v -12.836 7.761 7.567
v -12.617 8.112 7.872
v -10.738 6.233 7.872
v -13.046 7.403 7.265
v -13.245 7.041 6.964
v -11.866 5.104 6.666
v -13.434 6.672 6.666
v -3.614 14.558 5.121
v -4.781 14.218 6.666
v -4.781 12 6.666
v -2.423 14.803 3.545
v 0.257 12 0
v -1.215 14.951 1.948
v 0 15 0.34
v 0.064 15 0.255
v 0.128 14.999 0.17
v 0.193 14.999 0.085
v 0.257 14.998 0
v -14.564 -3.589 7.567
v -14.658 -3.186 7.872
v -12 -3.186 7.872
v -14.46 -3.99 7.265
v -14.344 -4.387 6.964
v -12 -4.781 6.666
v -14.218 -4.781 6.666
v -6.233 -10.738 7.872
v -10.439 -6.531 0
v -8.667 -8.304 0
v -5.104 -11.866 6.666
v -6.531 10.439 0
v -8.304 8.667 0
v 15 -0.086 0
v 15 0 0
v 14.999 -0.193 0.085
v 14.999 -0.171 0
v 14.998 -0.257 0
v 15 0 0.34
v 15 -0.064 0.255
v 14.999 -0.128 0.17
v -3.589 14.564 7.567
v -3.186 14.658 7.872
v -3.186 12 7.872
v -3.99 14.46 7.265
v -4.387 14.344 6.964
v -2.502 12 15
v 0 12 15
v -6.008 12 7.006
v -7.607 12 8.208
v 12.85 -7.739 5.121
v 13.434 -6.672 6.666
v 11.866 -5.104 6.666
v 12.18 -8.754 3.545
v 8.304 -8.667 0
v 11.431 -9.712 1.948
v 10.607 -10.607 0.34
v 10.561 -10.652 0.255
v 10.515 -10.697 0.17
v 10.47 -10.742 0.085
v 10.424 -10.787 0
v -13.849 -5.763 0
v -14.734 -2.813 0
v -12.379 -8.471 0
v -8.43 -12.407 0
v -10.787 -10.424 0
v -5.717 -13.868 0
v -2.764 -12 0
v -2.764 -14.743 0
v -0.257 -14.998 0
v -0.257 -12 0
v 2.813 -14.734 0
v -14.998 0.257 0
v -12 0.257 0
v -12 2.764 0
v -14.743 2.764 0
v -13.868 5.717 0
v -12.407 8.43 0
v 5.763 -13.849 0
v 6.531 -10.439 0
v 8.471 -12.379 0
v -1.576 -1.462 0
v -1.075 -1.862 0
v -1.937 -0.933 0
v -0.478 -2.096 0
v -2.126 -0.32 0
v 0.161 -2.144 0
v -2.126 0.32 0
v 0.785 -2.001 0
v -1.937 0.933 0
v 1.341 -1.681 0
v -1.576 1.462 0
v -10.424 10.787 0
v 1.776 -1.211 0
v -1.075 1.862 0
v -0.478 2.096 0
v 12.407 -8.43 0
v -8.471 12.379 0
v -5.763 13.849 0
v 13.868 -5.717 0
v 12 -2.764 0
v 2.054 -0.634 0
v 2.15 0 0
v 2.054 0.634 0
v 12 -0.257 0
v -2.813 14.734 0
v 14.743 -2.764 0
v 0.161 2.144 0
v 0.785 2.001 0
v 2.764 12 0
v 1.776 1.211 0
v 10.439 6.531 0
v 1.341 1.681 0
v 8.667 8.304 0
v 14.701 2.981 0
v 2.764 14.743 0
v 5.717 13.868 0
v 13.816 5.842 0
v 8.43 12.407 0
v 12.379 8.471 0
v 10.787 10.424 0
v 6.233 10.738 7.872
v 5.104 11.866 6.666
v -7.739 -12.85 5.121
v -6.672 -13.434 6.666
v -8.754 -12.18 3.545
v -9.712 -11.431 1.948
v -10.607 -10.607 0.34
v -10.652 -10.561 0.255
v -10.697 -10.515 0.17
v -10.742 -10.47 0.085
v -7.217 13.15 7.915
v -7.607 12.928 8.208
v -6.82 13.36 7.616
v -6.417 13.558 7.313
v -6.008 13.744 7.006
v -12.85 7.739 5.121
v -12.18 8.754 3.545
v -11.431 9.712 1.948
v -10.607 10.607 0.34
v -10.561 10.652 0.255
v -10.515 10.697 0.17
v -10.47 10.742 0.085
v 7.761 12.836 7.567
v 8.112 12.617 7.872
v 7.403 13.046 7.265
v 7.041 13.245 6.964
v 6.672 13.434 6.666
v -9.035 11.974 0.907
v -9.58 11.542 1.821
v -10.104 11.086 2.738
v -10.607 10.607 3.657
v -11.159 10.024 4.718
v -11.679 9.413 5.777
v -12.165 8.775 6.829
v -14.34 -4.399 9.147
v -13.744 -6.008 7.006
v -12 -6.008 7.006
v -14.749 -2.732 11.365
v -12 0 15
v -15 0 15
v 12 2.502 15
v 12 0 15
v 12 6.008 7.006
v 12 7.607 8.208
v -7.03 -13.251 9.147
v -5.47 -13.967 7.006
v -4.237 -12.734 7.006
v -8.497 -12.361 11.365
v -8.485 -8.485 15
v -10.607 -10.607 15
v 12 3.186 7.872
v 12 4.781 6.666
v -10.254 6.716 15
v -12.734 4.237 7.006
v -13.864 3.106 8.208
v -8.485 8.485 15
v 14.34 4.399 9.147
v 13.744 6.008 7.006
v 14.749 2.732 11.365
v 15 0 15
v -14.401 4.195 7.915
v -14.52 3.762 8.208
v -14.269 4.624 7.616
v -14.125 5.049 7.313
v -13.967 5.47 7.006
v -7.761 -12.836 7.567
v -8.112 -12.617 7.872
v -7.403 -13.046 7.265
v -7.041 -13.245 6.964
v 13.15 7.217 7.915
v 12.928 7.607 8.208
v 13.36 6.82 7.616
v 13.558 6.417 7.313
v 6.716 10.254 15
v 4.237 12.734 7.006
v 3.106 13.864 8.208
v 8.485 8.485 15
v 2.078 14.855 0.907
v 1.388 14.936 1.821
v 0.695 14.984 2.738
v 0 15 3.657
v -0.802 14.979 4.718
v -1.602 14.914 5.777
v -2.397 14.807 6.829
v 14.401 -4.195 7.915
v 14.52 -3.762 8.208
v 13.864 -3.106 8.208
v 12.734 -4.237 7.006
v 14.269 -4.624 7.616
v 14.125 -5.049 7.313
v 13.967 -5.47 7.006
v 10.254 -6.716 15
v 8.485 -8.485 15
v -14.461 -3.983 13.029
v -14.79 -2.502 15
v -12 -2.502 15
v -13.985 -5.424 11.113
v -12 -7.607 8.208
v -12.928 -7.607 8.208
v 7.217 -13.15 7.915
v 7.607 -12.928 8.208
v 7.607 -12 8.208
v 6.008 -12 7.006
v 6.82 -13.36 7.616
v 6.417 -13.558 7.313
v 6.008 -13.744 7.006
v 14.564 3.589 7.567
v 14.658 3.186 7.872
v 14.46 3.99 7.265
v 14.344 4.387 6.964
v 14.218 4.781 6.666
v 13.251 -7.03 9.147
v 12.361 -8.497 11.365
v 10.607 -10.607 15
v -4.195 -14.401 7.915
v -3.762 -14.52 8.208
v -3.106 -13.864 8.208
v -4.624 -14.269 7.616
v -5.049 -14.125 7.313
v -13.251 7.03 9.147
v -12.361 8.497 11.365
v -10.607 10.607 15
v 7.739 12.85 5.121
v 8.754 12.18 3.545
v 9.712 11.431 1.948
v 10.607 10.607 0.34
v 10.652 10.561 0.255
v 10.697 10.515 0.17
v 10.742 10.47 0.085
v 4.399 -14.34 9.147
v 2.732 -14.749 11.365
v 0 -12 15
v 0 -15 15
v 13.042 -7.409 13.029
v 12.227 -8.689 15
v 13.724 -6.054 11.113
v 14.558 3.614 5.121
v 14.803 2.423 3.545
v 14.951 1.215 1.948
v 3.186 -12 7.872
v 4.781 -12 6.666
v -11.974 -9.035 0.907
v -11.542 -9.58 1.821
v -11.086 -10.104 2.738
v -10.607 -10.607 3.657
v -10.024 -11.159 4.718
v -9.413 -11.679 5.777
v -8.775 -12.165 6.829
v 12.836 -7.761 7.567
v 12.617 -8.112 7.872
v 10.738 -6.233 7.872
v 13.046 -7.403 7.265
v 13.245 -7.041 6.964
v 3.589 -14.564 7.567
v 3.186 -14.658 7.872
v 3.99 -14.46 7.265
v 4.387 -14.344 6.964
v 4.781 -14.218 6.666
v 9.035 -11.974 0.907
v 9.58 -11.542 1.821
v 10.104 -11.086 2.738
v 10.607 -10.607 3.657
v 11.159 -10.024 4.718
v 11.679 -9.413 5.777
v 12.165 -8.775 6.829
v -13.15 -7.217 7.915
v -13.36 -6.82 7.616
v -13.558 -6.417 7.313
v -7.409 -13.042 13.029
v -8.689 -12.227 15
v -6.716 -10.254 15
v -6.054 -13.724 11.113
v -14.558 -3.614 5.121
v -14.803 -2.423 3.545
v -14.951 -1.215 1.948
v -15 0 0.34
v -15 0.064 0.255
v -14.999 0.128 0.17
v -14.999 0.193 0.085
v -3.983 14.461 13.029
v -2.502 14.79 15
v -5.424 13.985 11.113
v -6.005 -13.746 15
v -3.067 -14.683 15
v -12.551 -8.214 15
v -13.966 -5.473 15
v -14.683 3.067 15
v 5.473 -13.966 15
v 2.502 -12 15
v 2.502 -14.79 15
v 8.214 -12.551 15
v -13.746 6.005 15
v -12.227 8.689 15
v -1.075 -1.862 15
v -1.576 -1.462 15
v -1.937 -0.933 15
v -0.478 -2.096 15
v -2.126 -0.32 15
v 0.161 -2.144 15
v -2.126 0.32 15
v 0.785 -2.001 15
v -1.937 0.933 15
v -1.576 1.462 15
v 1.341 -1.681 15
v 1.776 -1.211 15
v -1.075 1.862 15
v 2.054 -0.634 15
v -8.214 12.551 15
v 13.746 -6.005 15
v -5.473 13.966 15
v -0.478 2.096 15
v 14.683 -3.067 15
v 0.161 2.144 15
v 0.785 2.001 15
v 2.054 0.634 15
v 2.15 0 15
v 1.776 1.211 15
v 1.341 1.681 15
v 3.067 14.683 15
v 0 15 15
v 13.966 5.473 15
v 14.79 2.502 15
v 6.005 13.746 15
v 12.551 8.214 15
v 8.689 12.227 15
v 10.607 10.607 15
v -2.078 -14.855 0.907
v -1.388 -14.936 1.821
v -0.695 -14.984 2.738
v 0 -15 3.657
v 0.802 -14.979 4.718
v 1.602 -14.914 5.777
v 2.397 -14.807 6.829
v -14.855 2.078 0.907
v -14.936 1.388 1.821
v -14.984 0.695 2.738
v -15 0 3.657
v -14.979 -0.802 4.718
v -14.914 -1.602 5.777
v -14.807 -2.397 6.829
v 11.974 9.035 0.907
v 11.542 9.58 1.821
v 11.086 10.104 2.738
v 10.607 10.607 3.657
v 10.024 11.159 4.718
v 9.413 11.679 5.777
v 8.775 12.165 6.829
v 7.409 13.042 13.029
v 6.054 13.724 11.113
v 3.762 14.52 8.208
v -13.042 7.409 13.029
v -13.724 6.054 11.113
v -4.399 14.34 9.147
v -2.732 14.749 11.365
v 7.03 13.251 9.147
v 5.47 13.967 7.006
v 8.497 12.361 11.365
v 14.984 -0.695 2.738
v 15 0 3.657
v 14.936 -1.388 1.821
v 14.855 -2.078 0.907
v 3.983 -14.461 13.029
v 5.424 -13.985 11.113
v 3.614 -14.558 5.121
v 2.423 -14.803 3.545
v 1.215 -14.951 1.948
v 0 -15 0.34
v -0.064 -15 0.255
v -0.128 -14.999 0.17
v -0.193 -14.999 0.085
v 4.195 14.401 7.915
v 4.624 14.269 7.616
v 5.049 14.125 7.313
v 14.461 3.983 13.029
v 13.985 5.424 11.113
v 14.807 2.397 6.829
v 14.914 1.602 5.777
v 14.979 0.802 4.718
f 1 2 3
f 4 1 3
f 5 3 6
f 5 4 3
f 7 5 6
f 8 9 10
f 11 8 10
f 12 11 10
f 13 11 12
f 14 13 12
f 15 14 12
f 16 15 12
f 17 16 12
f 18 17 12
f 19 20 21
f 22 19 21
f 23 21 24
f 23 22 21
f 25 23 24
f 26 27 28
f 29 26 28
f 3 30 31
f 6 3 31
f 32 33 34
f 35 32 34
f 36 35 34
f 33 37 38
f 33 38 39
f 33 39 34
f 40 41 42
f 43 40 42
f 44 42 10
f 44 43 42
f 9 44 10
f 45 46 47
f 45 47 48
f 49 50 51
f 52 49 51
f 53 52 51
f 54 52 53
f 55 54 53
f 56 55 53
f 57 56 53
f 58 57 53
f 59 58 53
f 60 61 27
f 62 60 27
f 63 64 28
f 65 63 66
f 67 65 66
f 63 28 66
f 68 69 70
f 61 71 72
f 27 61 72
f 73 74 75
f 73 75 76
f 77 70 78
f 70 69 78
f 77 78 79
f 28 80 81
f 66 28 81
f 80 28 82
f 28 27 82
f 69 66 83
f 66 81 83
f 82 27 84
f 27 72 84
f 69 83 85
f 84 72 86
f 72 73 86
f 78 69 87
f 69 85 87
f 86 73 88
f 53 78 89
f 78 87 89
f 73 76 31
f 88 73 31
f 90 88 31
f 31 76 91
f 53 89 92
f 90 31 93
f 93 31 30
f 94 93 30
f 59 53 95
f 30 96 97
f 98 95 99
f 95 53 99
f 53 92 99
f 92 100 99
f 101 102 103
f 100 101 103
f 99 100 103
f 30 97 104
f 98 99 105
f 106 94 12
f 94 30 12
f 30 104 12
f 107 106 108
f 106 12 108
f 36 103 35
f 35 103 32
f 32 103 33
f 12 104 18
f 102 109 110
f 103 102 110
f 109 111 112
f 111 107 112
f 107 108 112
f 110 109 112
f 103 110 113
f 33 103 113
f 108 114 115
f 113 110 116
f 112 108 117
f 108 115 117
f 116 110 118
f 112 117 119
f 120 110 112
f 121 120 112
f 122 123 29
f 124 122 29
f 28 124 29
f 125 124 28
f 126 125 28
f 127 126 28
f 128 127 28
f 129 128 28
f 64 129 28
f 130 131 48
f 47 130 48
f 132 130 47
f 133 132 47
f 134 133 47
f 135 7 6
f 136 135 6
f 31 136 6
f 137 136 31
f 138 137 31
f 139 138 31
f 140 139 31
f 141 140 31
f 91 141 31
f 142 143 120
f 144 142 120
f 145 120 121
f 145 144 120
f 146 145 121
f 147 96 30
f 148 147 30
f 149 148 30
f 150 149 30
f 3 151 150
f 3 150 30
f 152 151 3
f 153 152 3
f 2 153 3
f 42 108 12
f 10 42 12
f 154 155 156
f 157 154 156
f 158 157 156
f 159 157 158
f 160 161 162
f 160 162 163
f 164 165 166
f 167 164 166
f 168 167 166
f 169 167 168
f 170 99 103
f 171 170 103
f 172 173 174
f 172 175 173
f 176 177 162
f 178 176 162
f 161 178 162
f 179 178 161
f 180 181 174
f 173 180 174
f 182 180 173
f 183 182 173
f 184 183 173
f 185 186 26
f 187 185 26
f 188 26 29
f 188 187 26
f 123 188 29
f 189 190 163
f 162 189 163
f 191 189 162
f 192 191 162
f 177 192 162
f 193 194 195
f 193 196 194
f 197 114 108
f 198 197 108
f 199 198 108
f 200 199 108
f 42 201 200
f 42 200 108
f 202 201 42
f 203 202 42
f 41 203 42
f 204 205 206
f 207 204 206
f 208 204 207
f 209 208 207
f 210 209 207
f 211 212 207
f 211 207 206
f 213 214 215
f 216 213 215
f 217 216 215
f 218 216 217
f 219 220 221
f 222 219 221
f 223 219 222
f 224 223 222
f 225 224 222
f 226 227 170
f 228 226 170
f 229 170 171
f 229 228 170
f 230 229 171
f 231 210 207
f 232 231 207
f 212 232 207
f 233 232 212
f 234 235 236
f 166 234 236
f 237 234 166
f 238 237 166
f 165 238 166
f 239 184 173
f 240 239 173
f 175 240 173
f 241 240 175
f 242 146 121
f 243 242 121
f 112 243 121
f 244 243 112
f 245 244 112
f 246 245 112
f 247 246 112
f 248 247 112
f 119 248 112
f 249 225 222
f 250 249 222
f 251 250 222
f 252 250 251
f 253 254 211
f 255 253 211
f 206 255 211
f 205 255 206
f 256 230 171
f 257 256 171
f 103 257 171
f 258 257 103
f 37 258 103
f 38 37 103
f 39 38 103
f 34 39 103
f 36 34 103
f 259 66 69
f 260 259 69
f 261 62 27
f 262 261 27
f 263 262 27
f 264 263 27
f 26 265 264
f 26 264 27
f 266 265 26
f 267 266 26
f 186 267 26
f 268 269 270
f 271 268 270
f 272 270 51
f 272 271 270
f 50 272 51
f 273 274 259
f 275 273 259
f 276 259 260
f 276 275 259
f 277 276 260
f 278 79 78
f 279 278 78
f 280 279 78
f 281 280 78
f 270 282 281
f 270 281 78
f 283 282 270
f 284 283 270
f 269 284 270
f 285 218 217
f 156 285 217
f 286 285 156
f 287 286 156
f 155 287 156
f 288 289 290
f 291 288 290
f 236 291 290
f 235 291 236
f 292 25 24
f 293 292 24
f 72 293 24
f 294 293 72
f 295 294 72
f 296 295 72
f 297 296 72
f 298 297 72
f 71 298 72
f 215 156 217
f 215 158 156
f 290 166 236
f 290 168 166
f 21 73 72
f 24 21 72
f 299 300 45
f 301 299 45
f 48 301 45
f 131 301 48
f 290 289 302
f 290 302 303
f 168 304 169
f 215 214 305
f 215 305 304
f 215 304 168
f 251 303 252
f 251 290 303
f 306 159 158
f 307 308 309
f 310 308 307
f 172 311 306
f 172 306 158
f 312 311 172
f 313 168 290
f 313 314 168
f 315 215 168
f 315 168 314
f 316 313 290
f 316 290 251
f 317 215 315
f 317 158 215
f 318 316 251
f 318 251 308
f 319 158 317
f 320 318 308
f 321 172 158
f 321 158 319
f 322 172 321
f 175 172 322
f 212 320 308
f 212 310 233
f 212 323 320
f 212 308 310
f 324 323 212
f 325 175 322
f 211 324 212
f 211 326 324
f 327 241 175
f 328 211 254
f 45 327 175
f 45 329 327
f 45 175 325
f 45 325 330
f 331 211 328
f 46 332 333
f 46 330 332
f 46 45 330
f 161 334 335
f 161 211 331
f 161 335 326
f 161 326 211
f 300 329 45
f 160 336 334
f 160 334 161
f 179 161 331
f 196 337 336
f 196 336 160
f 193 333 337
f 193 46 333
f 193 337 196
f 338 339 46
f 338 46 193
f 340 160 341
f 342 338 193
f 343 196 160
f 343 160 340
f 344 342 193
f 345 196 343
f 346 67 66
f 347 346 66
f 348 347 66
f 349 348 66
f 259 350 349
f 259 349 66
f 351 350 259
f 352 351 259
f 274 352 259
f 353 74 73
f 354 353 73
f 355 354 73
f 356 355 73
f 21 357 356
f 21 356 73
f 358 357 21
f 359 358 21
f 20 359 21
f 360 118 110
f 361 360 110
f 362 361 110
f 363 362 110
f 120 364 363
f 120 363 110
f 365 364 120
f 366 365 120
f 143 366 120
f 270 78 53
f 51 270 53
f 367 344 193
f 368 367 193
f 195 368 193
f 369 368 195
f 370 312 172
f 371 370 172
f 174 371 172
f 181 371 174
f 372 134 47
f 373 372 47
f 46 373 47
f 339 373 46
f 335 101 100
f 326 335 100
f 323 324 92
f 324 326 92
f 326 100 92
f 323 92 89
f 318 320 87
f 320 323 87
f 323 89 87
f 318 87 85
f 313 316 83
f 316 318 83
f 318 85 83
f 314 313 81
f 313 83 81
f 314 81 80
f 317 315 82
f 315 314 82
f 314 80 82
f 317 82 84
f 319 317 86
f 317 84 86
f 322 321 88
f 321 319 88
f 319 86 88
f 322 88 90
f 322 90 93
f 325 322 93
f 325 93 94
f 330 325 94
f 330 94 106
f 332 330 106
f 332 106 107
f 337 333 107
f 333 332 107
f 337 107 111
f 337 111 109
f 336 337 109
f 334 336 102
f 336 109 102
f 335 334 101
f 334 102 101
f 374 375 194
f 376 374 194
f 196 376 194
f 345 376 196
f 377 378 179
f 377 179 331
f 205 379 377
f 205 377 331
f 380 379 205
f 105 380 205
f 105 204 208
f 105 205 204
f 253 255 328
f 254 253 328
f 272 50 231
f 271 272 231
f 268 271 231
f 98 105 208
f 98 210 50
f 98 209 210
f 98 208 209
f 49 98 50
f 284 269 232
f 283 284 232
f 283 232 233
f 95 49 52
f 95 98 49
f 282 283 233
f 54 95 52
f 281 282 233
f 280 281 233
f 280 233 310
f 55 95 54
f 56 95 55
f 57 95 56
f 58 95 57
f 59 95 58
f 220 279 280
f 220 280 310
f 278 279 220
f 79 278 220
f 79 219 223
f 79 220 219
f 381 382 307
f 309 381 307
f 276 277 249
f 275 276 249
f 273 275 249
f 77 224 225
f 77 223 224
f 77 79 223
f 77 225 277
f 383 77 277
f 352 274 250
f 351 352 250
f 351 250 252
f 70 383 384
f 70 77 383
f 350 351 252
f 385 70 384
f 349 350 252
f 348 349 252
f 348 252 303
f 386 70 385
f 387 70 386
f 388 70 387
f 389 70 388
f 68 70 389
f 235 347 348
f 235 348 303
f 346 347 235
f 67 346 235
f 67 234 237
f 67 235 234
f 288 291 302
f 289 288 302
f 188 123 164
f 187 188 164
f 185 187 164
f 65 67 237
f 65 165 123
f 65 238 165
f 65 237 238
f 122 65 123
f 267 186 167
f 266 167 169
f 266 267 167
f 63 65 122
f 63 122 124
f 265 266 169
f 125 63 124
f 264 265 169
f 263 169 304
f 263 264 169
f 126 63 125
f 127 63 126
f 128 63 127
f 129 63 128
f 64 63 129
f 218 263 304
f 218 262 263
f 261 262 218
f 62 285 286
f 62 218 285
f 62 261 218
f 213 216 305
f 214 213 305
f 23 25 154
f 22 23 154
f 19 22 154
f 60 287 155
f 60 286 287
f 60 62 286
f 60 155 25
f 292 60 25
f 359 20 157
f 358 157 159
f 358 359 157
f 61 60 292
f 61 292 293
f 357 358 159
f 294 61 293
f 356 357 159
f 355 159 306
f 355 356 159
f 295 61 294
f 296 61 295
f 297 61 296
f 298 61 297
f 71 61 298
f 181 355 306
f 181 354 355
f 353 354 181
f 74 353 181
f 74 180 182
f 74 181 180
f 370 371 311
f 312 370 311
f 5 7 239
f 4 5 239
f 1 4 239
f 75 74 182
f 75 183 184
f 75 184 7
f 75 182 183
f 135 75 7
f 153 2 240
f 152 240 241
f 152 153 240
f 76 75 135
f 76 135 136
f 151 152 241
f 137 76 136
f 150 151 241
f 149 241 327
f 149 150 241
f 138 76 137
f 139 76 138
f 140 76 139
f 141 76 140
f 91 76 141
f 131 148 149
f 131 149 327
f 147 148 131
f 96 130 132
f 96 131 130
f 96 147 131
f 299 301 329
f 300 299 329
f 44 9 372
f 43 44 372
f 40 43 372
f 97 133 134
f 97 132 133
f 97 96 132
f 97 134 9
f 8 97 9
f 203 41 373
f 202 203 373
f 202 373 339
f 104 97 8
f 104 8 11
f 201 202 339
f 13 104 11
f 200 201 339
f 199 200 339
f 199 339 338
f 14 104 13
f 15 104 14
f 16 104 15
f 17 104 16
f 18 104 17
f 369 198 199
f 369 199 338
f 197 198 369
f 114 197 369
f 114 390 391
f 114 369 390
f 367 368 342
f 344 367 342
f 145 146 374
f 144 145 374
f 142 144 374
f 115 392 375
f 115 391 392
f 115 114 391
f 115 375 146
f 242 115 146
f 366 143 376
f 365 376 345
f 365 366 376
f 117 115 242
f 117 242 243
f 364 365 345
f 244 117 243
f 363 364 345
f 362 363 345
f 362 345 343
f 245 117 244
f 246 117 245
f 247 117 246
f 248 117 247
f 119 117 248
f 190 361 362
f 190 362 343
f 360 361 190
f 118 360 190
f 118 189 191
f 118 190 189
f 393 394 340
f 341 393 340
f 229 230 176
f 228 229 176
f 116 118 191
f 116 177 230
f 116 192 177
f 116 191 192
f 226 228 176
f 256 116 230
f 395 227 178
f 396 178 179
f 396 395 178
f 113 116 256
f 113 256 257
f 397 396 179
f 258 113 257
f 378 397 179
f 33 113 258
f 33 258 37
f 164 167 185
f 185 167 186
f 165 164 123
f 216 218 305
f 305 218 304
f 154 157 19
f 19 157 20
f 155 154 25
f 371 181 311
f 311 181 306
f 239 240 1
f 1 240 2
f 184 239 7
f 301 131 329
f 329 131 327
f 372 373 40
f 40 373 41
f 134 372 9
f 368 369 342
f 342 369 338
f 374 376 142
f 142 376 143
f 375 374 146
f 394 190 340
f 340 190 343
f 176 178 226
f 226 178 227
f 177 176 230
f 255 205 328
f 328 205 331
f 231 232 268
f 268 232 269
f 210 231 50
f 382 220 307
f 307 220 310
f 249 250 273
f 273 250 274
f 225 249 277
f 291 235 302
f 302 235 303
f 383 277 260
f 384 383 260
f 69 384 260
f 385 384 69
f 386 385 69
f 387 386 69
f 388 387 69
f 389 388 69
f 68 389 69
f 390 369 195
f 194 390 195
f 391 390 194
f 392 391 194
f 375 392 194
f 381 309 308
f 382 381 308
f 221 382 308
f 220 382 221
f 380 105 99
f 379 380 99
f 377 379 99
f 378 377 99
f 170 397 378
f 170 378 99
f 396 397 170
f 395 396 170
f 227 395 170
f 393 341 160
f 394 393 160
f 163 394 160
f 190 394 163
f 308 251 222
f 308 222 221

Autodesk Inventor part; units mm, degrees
ref_plane "YZ Plane" through (0, 0, 0) normal (1, 0, 0) x (0, 1, 0)
ref_plane "XZ Plane" through (0, 0, 0) normal (0, 1, 0) x (-1, 0, 0)
sketch "Sketch1" plane through (0, 0, 0) normal (0, 0, 1) x (1, 0, 0)
  circle A0 centre (0, 0) radius 2.15
  circle A1 centre (0, 0) radius 15
  dimension "d0" = 4.3
  dimension "d1" = 30
extrude "Extrusion1" add sketch "Sketch1" along normal blind 15
sketch "Sketch3" plane through (0, 0, 15) normal (0, 0, 1) x (1, 0, 0)
  point P0 (0, 0)
  point P1 (0, 15)
ref_plane "Work Plane1" through (0, 15, 15) normal (0, 1, 0) x (-1, 0, 0)
sketch "Sketch4" plane through (0, 15, 15) normal (0, 1, 0) x (-1, 0, 0)
  line L0 (15, 0) -> (-15, 0) projected
  line L1 (0, 0) -> (1.5987, 1.2017)
  line L2 (1.5987, 1.2017) -> (7.6071, -6.792)
  line L3 (7.6071, -6.792) -> (6.0084, -7.9937)
  line L4 (6.0084, -7.9937) -> (0, 0)
  line L5 (3.1858, -7.1278) -> (4.7814, -8.3336)
  line L6 (4.7814, -8.3336) -> (-1.2479, -16.3116)
  line L7 (-1.2479, -16.3116) -> (-2.8435, -15.1057)
  line L8 (-2.8435, -15.1057) -> (3.1858, -7.1278)
  point P0 (0, -15)
  dimension "d8" = 2
  dimension "d9" = 10
  dimension "d10" = 2
  dimension "d11" = 10
extrude "Extrusion3" cut sketch "Sketch4" against normal blind 3
pattern_circular "Circular Pattern1" count 8 over 360 about axis through (0, 0, 0) along (0, 0, 1) of "Extrusion3"
properties part number "Wheel"
